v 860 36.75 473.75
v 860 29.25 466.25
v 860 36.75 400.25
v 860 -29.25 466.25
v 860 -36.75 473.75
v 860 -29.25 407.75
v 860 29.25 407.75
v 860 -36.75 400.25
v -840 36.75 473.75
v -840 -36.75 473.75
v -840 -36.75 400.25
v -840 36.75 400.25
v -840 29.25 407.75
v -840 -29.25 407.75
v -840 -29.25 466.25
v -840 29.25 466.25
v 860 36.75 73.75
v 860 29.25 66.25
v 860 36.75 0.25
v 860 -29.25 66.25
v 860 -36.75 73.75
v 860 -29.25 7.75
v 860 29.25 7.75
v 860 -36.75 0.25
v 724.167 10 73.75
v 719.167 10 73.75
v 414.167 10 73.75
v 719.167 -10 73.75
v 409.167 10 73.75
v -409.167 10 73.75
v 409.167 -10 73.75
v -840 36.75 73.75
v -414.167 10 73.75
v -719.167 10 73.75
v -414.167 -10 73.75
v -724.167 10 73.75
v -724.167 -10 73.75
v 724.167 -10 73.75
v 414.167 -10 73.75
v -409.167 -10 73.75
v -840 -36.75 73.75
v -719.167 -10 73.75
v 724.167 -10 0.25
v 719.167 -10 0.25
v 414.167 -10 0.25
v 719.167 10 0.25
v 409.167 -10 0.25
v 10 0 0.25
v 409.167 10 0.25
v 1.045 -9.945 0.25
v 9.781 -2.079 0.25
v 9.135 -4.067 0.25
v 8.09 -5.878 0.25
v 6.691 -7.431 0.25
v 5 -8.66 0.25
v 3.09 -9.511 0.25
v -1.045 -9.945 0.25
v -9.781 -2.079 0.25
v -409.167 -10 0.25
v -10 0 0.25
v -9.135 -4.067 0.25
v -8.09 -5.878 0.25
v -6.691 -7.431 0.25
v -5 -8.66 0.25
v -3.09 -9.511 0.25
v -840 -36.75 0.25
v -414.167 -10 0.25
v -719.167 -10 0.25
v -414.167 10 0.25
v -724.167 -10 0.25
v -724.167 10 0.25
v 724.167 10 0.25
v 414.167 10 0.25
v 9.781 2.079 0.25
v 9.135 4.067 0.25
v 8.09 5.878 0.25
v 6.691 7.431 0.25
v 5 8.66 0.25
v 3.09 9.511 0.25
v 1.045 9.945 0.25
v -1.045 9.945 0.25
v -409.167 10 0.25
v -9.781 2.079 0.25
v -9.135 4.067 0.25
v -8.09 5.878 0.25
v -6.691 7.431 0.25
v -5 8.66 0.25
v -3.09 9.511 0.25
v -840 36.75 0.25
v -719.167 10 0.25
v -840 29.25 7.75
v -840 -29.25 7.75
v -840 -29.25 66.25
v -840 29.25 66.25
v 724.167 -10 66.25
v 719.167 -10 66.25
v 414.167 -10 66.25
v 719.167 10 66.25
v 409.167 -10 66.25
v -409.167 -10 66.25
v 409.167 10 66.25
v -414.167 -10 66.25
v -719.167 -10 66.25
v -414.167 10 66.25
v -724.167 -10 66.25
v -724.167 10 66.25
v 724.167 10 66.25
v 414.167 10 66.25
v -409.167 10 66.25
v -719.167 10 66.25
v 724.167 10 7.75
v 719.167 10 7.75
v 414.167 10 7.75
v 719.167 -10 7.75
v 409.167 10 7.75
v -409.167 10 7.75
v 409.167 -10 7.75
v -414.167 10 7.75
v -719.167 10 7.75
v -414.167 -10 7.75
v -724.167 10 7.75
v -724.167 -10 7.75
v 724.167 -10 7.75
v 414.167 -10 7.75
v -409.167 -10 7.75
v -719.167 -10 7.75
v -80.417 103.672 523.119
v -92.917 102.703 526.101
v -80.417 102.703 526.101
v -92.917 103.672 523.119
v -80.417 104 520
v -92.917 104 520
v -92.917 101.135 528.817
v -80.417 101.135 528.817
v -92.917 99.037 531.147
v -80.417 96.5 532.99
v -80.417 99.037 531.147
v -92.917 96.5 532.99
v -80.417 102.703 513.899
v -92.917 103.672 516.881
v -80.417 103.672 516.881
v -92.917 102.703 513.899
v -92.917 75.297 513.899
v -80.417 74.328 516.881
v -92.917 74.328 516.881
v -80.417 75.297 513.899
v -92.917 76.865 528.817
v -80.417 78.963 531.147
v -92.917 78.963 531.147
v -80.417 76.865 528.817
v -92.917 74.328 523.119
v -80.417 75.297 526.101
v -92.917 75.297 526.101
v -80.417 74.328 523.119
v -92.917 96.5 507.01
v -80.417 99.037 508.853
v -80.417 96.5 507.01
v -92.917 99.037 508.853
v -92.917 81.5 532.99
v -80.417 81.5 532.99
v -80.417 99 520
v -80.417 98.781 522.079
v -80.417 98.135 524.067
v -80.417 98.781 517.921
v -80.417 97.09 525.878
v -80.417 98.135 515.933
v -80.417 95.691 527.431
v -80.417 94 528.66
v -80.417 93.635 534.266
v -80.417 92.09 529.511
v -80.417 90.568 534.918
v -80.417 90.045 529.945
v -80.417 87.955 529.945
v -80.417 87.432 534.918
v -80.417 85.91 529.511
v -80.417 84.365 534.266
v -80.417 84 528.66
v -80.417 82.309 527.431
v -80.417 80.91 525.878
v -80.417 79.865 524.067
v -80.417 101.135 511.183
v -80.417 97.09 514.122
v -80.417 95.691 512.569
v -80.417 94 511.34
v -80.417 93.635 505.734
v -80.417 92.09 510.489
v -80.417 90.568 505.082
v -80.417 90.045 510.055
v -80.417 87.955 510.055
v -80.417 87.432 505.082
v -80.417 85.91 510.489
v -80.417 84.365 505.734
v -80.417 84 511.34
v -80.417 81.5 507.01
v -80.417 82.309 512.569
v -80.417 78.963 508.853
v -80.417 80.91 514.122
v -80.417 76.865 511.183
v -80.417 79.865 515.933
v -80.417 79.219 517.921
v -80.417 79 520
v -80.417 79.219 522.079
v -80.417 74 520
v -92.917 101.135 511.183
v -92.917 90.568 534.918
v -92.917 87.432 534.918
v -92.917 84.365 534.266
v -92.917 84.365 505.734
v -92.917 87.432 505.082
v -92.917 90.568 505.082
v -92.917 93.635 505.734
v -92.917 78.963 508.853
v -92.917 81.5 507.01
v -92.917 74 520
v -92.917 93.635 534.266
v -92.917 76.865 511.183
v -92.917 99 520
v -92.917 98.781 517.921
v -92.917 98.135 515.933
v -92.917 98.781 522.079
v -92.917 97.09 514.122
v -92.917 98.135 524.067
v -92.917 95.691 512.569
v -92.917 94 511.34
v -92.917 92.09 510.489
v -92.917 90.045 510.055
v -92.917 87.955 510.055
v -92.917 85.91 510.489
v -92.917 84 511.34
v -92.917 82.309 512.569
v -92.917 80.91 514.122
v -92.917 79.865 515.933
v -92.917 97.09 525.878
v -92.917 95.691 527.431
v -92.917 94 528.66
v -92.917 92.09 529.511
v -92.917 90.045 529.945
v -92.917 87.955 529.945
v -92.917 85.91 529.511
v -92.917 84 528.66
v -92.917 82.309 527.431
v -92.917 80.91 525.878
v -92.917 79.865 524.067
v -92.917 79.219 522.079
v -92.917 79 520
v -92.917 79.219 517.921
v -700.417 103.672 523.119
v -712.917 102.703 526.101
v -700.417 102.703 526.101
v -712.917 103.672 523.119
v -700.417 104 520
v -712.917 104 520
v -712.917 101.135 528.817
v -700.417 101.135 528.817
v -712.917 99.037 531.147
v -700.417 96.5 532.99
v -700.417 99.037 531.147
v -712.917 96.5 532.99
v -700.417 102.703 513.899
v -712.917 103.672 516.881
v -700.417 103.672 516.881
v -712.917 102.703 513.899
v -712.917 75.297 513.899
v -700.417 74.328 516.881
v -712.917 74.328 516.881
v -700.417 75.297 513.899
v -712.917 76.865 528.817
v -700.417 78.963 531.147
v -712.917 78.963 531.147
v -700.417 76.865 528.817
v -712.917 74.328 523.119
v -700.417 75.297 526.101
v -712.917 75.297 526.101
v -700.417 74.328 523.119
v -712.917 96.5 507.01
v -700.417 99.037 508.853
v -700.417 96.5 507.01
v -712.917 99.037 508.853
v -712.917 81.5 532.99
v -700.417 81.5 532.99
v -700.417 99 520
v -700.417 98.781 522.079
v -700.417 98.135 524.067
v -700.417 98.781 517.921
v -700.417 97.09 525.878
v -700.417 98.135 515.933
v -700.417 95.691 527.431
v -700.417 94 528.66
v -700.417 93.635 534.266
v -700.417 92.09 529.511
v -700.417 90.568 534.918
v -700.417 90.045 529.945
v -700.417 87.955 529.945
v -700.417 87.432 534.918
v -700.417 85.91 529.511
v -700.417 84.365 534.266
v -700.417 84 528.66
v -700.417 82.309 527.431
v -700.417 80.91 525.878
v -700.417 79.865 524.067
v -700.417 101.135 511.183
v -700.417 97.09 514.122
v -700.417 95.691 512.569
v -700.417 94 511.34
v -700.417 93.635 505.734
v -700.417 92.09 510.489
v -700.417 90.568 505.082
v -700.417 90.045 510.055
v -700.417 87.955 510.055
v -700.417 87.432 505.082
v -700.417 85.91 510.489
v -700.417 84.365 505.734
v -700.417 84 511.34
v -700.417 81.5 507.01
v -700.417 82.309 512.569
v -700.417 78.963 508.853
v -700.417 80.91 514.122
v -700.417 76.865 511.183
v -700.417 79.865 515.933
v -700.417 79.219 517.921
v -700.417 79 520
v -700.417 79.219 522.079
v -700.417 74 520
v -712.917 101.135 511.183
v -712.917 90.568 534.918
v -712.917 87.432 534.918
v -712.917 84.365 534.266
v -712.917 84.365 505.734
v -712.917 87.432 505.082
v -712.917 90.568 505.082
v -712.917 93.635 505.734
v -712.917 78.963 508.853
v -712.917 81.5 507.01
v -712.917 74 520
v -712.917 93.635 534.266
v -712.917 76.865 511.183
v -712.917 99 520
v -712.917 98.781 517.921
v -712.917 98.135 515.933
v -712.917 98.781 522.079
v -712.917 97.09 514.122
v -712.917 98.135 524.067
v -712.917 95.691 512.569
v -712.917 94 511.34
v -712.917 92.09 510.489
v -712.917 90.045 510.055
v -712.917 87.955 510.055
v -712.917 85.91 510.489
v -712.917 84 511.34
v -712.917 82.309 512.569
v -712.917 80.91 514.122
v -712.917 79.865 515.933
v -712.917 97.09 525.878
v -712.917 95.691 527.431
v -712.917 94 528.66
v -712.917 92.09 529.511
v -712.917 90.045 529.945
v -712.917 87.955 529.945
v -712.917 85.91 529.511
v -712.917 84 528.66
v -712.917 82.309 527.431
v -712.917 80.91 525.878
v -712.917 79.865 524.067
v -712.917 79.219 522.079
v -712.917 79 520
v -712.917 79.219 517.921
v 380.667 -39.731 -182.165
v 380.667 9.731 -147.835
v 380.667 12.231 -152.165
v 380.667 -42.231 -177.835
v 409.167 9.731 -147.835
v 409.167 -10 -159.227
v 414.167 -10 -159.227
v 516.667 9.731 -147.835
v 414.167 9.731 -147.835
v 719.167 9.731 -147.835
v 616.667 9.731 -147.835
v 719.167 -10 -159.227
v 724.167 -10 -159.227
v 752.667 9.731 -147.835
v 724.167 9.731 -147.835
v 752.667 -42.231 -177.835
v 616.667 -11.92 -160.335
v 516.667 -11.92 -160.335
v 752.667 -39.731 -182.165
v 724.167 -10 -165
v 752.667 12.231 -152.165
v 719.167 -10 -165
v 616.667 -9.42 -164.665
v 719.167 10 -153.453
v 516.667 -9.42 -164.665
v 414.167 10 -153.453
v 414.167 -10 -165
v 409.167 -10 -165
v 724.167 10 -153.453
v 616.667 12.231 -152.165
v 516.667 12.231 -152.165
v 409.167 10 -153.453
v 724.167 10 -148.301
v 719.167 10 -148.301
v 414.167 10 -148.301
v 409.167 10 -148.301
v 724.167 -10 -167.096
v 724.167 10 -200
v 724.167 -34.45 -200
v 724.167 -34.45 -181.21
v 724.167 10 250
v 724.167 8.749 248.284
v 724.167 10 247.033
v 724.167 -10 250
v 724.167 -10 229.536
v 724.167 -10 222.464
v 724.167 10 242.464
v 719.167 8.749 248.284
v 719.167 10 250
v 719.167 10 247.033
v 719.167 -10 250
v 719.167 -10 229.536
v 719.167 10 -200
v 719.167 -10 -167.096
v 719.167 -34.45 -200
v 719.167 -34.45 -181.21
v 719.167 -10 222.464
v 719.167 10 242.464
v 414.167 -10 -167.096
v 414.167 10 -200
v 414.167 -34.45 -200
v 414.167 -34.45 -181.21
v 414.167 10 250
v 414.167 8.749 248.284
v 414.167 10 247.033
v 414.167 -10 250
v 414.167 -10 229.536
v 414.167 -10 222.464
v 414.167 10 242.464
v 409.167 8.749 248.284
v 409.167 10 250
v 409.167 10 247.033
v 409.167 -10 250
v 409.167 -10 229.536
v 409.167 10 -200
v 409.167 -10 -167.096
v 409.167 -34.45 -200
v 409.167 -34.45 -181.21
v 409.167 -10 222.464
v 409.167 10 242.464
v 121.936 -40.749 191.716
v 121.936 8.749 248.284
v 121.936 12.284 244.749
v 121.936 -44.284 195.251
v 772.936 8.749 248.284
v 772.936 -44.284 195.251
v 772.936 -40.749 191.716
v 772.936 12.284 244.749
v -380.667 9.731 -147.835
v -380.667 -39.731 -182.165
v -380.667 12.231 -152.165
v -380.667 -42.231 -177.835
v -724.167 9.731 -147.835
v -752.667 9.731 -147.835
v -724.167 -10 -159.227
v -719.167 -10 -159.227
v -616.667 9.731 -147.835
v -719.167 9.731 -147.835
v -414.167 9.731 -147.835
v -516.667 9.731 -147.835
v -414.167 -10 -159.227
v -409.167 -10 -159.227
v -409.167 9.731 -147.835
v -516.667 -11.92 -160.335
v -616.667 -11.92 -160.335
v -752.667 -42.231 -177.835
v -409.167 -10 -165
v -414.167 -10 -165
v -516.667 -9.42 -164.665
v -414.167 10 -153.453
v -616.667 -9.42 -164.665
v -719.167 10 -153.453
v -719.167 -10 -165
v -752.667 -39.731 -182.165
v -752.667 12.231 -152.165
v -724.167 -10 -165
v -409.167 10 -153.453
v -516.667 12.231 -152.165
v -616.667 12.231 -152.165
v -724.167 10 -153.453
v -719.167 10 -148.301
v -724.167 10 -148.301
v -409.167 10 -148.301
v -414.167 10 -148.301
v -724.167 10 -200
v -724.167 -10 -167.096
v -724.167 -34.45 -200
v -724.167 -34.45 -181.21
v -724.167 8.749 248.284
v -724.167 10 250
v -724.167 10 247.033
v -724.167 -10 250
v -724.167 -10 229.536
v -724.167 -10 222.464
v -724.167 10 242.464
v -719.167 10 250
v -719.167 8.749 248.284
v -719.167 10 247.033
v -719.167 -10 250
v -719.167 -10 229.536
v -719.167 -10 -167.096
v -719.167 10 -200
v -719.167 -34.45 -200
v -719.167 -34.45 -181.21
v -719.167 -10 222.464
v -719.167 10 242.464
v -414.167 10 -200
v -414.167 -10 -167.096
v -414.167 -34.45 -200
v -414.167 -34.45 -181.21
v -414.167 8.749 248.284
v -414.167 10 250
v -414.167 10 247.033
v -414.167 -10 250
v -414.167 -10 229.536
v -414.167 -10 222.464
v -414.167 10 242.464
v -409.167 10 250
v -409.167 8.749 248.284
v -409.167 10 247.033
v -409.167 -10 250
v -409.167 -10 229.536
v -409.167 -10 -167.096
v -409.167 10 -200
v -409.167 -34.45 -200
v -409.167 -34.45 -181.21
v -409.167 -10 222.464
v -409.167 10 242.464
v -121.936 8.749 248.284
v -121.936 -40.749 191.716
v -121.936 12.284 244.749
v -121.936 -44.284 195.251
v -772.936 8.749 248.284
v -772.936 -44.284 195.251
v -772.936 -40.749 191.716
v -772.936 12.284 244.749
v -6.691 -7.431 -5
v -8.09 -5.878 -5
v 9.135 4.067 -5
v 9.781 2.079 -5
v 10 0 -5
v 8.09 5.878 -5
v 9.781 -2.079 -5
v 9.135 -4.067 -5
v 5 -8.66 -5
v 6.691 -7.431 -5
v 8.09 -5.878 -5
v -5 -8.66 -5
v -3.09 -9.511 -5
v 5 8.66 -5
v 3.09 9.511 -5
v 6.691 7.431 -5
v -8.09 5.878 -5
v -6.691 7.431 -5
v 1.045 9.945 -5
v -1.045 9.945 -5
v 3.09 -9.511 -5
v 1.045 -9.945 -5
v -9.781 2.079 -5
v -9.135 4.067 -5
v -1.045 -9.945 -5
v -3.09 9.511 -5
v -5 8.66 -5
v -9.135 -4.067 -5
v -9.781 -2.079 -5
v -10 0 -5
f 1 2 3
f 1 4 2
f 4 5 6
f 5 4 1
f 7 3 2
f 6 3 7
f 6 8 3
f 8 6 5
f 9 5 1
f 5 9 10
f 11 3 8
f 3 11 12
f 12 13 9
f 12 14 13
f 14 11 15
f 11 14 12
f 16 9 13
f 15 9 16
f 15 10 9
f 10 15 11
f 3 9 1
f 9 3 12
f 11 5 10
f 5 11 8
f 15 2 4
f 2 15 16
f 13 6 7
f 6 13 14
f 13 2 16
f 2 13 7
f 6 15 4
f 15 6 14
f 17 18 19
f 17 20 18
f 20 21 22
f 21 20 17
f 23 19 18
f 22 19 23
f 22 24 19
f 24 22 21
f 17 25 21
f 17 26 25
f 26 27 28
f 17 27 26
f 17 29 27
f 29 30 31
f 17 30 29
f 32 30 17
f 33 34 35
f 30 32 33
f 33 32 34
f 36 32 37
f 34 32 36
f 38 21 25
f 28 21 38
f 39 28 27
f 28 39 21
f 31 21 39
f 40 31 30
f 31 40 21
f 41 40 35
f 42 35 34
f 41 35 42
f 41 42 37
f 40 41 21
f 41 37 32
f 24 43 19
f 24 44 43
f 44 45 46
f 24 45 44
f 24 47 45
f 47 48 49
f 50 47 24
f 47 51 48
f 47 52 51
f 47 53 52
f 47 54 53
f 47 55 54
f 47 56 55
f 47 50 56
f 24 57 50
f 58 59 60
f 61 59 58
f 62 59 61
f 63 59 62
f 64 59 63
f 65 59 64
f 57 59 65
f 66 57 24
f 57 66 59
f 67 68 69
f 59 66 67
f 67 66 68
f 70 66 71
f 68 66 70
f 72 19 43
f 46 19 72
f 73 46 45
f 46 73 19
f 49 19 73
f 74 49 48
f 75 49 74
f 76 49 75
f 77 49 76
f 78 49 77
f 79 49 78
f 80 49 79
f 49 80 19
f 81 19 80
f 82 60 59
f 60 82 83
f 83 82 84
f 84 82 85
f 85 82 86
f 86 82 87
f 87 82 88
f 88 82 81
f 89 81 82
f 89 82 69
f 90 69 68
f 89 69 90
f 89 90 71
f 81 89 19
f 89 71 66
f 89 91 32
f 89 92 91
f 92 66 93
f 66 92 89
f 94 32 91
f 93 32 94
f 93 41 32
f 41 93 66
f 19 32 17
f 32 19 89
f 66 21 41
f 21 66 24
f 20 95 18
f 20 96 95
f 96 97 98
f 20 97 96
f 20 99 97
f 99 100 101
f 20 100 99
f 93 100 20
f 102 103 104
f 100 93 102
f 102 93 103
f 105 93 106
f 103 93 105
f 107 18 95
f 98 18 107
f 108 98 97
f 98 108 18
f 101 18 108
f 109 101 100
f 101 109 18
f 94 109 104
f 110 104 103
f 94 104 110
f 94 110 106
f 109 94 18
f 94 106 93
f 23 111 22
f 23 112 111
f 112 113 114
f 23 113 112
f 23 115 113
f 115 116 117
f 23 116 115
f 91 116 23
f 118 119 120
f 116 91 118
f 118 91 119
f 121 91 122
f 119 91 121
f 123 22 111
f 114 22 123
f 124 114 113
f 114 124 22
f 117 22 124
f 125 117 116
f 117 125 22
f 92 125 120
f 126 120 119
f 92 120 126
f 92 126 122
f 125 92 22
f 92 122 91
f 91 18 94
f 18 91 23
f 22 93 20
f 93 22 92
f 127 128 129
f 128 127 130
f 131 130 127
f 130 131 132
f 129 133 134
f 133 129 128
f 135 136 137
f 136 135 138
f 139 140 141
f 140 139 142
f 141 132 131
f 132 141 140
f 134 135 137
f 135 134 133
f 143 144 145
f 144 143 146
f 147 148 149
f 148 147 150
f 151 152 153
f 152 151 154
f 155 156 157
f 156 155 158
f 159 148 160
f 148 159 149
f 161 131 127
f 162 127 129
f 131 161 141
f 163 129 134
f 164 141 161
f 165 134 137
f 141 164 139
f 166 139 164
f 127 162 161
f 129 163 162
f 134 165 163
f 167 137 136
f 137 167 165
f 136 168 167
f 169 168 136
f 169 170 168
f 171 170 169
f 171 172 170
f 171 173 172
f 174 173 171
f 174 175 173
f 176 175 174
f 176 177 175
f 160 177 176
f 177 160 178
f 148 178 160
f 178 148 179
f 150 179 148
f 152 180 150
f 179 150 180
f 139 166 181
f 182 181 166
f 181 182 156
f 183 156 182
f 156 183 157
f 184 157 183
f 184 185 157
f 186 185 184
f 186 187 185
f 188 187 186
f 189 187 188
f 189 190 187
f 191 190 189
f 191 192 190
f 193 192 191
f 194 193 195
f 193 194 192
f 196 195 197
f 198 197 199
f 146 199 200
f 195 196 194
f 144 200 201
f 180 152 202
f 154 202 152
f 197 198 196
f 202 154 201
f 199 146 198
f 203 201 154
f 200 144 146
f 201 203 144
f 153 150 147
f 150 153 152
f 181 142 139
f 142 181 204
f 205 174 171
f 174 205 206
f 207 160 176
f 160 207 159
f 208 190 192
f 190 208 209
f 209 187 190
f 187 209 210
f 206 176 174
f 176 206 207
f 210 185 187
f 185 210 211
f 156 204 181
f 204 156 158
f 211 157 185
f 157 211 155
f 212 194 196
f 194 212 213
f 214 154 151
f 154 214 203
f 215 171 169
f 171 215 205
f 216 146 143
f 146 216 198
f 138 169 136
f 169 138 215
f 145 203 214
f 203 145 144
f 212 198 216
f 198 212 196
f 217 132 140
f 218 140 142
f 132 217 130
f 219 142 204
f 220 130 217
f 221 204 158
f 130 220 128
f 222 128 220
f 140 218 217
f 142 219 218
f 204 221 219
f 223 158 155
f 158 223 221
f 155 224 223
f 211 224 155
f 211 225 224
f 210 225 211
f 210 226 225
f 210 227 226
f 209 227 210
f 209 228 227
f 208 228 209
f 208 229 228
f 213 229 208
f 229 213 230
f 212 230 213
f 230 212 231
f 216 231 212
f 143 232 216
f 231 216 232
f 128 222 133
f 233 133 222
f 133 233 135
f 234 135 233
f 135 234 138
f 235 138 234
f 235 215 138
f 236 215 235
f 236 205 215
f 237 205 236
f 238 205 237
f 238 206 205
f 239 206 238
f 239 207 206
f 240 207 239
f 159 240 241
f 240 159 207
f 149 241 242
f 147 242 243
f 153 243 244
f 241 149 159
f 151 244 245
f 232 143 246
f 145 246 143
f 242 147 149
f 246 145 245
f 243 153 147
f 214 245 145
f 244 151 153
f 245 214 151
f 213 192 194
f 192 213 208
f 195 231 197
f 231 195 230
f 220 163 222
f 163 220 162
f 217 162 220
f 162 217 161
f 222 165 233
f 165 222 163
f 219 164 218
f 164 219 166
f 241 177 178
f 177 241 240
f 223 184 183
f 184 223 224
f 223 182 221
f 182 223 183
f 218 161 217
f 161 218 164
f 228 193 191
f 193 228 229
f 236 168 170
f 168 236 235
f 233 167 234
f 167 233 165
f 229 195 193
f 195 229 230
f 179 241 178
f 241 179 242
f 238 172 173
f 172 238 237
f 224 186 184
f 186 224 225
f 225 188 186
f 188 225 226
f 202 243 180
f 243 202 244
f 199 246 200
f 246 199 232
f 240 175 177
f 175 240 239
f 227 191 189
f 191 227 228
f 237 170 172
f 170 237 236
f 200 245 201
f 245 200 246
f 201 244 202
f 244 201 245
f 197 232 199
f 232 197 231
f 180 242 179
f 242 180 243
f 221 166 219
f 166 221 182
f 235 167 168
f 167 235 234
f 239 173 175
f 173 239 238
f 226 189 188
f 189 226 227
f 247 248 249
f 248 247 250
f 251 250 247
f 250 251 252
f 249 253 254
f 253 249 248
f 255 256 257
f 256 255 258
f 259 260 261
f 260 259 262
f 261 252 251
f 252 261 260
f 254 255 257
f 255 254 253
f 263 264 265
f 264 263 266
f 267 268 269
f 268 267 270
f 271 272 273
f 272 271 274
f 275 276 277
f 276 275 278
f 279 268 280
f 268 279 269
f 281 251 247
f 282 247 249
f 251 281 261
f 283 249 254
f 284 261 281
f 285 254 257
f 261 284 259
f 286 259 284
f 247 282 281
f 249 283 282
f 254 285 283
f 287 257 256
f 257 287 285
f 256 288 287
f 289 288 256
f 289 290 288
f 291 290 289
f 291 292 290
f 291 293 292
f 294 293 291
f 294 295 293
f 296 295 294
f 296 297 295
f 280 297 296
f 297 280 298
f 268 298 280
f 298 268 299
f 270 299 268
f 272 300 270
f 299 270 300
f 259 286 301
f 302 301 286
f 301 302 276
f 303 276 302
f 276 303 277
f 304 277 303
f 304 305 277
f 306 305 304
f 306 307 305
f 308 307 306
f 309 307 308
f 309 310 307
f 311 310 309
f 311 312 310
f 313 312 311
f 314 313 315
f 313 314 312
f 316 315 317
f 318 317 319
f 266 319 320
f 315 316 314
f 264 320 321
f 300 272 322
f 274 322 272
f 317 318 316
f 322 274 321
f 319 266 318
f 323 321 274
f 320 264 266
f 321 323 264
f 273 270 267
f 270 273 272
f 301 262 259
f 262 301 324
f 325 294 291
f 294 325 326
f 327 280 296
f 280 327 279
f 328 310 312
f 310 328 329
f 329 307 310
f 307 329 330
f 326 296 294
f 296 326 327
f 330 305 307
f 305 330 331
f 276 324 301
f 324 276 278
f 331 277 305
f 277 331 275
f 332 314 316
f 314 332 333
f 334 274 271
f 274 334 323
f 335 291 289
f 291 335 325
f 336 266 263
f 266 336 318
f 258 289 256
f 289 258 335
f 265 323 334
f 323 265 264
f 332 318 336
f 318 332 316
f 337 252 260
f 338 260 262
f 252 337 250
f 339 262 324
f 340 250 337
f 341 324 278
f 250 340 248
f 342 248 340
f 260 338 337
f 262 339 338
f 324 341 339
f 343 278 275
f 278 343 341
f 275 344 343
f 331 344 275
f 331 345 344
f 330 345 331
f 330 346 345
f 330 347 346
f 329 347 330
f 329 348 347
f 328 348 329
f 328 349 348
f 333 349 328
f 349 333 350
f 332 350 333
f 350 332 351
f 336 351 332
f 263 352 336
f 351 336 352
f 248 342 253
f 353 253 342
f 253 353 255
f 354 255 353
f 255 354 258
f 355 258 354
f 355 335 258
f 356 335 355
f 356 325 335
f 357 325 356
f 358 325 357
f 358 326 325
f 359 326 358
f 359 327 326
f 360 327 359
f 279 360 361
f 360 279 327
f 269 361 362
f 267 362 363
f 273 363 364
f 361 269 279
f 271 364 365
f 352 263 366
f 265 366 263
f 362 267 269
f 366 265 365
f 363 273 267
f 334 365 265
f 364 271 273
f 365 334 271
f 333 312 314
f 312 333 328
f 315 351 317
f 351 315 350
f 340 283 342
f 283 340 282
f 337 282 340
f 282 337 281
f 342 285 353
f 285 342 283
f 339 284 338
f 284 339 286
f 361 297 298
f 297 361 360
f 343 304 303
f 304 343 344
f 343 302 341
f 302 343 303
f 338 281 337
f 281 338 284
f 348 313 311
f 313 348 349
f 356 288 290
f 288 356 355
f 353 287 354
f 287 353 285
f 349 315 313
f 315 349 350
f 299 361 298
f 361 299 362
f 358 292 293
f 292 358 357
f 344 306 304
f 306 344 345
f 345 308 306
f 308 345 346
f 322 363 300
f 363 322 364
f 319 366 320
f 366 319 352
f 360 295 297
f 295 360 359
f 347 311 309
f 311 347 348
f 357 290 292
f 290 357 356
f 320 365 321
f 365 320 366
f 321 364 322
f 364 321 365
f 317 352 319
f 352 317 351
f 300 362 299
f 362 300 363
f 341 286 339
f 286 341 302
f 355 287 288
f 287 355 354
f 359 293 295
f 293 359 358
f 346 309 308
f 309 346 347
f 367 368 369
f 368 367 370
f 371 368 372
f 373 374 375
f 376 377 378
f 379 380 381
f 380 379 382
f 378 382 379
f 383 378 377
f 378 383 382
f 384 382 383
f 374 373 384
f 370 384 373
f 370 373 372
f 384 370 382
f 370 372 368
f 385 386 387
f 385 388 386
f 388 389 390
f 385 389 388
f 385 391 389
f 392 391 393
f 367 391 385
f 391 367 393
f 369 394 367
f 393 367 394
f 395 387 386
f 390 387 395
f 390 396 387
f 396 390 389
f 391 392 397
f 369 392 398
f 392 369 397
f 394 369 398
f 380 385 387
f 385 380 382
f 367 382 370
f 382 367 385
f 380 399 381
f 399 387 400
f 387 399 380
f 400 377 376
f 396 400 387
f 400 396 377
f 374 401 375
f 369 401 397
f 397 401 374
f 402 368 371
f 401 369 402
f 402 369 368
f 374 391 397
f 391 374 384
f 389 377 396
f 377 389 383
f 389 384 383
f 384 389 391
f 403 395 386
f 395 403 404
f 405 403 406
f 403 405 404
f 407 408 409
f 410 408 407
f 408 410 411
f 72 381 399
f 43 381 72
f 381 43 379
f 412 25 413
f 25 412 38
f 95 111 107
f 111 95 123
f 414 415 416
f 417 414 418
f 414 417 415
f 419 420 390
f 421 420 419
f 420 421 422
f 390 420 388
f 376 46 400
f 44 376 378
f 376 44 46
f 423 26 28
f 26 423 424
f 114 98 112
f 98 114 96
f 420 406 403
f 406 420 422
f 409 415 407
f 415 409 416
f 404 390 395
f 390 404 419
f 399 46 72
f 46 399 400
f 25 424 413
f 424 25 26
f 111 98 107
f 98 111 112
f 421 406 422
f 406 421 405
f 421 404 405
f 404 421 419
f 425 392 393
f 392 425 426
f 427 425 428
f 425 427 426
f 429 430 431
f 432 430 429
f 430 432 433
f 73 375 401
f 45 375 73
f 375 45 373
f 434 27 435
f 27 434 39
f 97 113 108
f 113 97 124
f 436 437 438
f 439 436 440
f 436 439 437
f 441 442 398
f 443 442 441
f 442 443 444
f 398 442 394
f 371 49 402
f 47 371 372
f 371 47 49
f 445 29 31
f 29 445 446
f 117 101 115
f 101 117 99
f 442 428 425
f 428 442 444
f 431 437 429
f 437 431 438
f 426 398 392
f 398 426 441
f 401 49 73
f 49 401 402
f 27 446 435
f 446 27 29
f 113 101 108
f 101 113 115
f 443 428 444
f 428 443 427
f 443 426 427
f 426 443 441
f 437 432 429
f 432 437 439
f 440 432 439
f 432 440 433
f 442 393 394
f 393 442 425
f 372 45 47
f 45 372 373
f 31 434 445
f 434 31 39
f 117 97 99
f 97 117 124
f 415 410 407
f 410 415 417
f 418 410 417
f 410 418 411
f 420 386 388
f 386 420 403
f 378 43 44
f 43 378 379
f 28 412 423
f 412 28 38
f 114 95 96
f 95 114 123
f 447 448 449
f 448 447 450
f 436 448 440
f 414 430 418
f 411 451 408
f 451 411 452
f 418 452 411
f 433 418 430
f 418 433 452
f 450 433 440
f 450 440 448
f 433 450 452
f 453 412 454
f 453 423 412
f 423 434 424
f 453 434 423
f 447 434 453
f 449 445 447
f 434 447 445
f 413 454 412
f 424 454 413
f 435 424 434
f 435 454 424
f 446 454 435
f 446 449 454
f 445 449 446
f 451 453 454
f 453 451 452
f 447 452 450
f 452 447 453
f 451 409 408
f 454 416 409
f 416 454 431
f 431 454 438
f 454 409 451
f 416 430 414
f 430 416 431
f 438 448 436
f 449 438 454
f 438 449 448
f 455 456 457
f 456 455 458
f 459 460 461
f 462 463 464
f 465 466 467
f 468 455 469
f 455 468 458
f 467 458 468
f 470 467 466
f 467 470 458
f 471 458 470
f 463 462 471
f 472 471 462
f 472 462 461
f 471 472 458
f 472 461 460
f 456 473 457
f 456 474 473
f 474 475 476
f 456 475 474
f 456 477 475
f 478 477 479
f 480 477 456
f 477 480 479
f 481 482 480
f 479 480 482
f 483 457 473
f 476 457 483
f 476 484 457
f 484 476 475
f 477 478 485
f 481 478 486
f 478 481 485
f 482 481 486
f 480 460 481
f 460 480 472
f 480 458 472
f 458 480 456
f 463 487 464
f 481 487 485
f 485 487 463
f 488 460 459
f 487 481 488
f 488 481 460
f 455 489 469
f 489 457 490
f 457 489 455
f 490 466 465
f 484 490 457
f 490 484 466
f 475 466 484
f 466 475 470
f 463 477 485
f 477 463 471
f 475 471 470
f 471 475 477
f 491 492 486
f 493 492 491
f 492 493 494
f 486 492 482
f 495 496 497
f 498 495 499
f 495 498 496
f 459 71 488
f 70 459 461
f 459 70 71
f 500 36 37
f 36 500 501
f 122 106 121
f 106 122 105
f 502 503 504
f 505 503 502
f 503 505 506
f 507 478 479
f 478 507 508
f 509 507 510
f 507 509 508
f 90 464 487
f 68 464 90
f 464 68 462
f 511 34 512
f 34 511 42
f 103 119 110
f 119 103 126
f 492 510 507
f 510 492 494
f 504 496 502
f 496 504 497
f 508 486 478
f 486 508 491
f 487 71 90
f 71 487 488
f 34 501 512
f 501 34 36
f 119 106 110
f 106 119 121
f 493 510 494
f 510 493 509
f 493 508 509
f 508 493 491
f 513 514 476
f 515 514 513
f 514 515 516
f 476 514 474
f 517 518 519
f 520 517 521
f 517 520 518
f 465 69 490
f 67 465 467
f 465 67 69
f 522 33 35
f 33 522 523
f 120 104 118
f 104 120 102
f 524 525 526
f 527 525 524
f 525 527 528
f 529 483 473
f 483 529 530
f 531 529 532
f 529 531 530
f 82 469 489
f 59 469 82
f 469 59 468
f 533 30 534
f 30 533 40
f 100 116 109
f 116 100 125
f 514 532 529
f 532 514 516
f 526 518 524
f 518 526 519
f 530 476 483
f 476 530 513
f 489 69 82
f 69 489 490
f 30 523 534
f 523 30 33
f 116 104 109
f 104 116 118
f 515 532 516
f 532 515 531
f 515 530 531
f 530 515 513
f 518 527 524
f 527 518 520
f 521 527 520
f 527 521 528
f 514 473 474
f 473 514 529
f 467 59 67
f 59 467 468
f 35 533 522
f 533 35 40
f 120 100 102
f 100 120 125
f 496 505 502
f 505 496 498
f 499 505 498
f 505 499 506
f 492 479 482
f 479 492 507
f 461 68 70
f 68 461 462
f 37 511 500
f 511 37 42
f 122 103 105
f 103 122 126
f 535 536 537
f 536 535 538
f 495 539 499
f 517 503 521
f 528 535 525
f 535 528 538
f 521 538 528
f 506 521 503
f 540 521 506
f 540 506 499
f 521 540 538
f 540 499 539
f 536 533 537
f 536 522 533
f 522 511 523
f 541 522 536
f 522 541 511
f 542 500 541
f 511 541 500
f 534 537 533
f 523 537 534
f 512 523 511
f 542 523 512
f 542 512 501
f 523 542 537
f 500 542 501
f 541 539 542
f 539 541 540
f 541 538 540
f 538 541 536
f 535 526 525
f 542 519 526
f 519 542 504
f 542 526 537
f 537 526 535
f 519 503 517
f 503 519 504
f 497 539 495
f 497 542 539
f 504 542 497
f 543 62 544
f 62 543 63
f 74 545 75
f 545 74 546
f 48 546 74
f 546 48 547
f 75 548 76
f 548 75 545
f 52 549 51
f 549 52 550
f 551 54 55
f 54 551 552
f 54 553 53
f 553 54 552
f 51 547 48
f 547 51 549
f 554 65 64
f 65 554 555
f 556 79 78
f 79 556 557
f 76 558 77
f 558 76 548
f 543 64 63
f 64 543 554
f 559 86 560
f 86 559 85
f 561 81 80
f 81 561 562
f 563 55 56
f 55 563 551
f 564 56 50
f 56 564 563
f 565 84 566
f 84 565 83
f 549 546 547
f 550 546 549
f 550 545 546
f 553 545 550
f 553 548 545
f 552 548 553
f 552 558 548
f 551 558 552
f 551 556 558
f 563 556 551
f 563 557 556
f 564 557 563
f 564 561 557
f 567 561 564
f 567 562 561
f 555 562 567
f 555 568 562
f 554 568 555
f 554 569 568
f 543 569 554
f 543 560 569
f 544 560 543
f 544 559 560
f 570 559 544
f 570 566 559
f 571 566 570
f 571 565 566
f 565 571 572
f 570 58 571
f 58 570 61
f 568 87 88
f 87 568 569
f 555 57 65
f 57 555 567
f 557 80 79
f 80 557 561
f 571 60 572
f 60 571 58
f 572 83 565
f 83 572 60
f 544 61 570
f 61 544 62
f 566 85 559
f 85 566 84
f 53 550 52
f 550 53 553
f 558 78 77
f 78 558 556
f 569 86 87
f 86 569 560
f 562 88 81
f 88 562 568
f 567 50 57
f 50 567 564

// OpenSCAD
/*
ssqa module{
dependent from full length
this module in particular needs to be customizable
integrated with the squares
}
*/

// INDEPENDENT VARIABLES
/* Tynes Subassemblies parameters*/
l=1700;// width of grapples
tynes_num=10;//ammmount of inner tynes
sh_thick=5; // Sheet thickness

/*Lid Parameters*/
l_lid=620;

// DEPENDENT VARIABLES**DON'T CHANGE**
d_b_tynes=l/tynes_num;// distance between tynes recalculation
l_ratio=(l_lid-l_lid*0.07)/450;// Recalculation of front and up plate based on original size

d_b_bar=l_lid/2;
h_bar=450;

module sq_tube(length,size){
	difference(length,size) {
		cube([length,size*24.5,size*24.5], center=true);
		cube([length+length*0.2, size*(24.5)-15, size*(24.5)-15], center=true);
	}
}
/* sq_tube(l,3); */



module support_assem() {
	translate([0,0,37])
	rotate([0, 0, 0]) {
		translate([sh_thick*2+l/2,0,400])
		rotate([0,0,0])
		color("blue")
		sq_tube(l,3);

		translate([sh_thick*2+l/2,0,0])
		rotate([0,0,0])
		color("yellow")
		sq_tube(l,3);

	}

	module hinch(){
		rotate([0,90,0])linear_extrude(center=true,  height = sh_thick)import(file="hinch.dxf");
	}

	module mount_cylinder(){
		for (i=[0:4]) {
			translate([i*(sh_thick+sh_thick*0.1)-sh_thick*2, 0, 0])
			rotate([0,90,0])
			linear_extrude(center=true,  height = sh_thick)import(file="mount_cylinder.dxf");
		}

	}

	translate([0,15,-20]){
		rotate([0,0,0]){
						color("green"){
						translate([l/4-l_lid/2,-55,420])
						hinch();
						translate([l/4+l_lid/2,-55,420])
						hinch();
						translate([l/4,-55,420])
						mount_cylinder();
					}
					translate([l/3.75+l_lid/2,74,540])
					rotate([90,0,90])
					tube(15,sh_thick*2+sh_thick*0.5,5);

					translate([l/3.75-l_lid/2,74,540])
					rotate([90,0,90])
					tube(15,sh_thick*2+sh_thick*0.5,5);
		}
	}


}

module tube(r,lng,th){
	difference(){
		cylinder(r=r, h=lng, center=true);
		cylinder(r=r-th, h=lng+lng*0.2, center=true);
	}
}

module ssqa(){
	module base_part(){
		module triangle(o_len, a_len, depth, center=false)
		{
			centroid = center ? [-a_len/3, -o_len/3, -depth/2] : [0, 0, 0];
			translate(centroid) linear_extrude(height=depth)
			{
				polygon(points=[[0,0],[a_len,0],[0,o_len]], paths=[[0,1,2]]);
			}
		}

		cb_h=18.79;
		cb_l=44.45;
		translate([0,cb_h,0])
		triangle(cb_l-cb_h,cb_l,sh_thick, false);
		cube([cb_l,cb_h,sh_thick], center=false);
	}
	color("red")
	translate([0,15,-165]){
		rotate([-30, 0, 0]){
			difference() {
				cube(size=[d_b_bar+d_b_bar*0.2,60,sh_thick], center=true);
				translate([0,-30,0])
				cube(size=[100, 50, 50], center=true);
			}
		}
	}


	color("red") {
		translate([0,16,220])
		rotate([-45, 0, 0])
		union(){
			translate([d_b_bar/2.6,0,0])
			cube(size=[l_lid+l_lid*0.05,75,sh_thick], center=true);
		}
	}

	translate([0,0,25]){
	union(){
		translate([-d_b_bar/2-sh_thick/2,-10,-225])
		rotate([90,0,90])
		base_part();

		translate([d_b_bar/2-sh_thick/2,-10,-225])
		rotate([90,0,90])
		base_part();

		translate([d_b_bar/2,0,0])
		rotate([0, 90, 0])
		cube(size=[h_bar,20,sh_thick], center=true);

		translate([-d_b_bar/2,0,0])
		rotate([0, 90, 0])
		cube(size=[h_bar,20,sh_thick], center=true);
	}
}
}

translate([-l/2, 0, 0])
support_assem();

translate([l/3, 0, 0])
/* translate([l/3,-50,200]) */
rotate([0, 0, 180])
ssqa();

mirror(){
translate([l/3,0,0])
/* translate([l/5,-50,200]) */
rotate([0, 0, 180])
ssqa();
}

cylinder(r=10, h=10, center=true);
